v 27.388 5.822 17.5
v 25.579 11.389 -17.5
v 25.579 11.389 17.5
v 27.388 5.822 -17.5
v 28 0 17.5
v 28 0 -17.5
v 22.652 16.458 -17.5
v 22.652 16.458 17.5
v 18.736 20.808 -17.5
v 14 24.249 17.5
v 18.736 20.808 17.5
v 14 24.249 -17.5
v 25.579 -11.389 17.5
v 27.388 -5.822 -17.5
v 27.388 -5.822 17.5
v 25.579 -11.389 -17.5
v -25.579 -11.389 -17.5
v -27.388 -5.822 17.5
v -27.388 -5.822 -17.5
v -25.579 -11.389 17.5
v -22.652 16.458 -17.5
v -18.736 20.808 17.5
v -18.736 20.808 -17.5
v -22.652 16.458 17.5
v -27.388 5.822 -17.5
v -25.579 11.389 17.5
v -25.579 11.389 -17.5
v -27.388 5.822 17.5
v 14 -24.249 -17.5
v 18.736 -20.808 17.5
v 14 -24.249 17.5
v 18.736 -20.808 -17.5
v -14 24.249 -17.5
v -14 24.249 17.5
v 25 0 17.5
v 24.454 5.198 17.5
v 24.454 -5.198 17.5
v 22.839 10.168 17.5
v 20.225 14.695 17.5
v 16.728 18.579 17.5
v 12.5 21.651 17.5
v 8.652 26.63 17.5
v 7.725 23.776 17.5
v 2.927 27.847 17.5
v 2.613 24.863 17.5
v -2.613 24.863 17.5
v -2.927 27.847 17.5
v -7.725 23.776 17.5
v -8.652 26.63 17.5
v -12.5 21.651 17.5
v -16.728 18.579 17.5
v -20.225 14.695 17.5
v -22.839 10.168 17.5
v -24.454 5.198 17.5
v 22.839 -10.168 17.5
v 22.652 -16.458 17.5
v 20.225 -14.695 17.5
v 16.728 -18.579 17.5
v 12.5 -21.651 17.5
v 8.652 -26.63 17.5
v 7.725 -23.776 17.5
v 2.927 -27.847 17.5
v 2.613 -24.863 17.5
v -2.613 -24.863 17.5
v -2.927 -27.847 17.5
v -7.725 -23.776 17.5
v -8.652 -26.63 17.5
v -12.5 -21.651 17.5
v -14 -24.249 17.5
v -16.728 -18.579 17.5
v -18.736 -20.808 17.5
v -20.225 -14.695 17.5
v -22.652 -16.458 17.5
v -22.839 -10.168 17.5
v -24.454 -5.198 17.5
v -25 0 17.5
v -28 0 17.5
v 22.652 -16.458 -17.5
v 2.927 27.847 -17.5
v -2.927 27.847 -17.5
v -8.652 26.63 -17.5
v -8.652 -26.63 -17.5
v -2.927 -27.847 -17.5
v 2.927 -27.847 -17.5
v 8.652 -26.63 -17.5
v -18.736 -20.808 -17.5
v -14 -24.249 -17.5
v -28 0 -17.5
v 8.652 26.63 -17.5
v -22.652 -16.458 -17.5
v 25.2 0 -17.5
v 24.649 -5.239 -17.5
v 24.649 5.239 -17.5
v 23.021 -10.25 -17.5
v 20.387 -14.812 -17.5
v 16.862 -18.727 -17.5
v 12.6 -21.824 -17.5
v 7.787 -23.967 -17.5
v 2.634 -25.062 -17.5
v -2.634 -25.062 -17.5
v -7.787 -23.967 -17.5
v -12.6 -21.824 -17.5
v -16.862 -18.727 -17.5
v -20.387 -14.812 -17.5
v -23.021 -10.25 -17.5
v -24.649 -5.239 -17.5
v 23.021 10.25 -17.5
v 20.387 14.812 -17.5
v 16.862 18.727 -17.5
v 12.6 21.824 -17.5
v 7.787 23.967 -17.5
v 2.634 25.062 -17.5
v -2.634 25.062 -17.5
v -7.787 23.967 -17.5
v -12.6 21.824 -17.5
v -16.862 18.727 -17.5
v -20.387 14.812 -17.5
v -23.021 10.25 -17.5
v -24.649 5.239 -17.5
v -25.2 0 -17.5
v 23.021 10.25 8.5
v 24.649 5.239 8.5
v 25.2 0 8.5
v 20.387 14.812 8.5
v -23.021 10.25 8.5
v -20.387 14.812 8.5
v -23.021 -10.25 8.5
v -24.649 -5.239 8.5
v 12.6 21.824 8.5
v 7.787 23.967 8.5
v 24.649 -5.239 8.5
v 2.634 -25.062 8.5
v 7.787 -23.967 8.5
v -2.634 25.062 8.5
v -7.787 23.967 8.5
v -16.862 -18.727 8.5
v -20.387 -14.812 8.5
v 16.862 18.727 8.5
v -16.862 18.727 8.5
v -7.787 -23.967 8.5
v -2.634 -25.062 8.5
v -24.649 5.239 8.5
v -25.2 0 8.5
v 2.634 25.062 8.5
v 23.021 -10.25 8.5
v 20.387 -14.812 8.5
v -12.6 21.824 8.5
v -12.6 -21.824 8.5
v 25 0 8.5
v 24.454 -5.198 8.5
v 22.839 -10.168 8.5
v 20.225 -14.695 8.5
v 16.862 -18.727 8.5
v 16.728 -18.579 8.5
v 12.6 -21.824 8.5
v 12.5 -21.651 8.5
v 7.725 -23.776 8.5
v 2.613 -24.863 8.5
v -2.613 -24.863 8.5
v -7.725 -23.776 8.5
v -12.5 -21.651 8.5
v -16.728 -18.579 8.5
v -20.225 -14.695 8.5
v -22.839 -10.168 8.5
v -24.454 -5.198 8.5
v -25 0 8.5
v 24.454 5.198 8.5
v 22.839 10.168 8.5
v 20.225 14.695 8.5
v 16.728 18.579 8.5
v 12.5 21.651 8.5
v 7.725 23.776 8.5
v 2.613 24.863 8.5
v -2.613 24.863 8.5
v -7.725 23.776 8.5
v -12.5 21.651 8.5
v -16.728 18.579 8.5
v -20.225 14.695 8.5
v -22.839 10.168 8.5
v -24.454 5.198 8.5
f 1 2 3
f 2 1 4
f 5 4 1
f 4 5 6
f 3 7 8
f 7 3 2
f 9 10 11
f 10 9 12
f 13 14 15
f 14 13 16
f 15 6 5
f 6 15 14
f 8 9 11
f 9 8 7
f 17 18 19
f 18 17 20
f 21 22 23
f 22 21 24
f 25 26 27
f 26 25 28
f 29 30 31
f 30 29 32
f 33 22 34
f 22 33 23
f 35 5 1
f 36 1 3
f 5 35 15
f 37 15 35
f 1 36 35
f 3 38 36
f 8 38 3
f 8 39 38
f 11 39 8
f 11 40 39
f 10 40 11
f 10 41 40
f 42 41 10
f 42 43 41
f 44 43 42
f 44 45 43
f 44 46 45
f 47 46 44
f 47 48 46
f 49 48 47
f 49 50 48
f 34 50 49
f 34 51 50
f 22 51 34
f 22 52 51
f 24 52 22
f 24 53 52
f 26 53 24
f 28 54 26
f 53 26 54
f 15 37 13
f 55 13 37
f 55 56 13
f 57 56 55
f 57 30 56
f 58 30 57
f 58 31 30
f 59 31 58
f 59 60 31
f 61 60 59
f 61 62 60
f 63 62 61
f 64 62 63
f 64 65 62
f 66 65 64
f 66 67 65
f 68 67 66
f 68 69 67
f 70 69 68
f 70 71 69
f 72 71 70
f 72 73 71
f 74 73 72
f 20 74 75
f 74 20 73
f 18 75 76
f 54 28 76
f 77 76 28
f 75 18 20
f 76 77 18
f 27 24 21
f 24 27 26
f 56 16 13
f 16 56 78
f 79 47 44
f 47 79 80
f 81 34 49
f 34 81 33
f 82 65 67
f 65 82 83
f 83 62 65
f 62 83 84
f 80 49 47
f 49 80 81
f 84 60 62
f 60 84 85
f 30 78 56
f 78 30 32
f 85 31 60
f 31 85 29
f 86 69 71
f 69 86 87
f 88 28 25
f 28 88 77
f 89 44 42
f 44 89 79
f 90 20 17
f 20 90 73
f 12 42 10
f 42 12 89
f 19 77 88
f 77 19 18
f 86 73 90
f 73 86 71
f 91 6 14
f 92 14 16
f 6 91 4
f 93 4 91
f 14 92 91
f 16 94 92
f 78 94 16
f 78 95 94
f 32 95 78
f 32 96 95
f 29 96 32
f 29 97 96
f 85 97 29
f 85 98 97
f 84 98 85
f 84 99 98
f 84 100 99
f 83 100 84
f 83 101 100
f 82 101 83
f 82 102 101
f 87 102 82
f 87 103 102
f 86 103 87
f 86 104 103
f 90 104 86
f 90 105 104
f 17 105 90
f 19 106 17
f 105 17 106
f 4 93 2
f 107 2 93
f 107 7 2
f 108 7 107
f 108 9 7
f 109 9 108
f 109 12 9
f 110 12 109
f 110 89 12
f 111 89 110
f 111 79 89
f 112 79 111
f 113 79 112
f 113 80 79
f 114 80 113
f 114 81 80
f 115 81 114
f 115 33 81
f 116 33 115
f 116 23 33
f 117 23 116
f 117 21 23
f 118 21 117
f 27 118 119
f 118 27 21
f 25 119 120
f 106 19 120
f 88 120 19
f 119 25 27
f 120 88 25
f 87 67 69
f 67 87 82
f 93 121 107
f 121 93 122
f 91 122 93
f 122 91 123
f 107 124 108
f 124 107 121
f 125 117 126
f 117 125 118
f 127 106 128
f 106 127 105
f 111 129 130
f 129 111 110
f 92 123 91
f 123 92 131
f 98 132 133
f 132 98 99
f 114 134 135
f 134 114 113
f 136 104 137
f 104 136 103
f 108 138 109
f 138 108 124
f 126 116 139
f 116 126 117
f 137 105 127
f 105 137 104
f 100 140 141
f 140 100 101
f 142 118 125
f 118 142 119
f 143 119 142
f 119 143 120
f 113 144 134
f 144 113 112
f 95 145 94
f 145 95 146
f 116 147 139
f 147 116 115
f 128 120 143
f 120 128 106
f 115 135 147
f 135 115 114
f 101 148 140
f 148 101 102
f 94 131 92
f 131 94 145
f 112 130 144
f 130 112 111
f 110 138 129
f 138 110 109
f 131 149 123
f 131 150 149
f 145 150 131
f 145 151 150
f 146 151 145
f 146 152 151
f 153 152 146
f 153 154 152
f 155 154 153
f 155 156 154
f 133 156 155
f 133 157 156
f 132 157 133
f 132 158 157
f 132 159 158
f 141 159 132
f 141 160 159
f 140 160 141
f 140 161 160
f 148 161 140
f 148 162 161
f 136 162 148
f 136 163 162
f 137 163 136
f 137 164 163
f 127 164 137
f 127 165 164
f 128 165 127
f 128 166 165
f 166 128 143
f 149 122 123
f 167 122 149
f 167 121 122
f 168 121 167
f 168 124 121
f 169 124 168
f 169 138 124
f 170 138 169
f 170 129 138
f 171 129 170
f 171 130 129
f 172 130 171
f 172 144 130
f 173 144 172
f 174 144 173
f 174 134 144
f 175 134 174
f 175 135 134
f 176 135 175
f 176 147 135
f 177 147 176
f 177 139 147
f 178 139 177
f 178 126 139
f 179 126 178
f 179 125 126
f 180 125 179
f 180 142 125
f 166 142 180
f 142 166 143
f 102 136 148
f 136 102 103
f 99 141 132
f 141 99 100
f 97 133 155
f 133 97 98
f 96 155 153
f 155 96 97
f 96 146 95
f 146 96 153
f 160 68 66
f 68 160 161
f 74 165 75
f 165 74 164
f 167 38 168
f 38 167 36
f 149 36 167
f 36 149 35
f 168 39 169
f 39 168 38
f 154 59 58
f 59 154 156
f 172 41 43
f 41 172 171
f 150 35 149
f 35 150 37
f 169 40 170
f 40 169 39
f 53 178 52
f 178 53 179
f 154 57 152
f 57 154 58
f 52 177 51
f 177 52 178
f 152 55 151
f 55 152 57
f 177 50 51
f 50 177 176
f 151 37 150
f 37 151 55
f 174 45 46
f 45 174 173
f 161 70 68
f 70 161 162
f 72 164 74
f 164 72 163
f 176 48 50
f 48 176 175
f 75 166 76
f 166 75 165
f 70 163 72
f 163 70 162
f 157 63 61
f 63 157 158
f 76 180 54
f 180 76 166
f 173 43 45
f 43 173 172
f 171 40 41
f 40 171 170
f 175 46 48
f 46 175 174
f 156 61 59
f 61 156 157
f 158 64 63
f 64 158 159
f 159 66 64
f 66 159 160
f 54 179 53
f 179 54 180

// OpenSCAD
// Parameters
nominal_diameter_mm = 50; //[25:100:1]
tolerance_mm = 0.2; //[0.0:1.0:0.05]
wall_thickness_mm = 3.0; //[1.5:6.0:0.1]
cap_outer_diameter_mm = 56.0; //[45.0:80.0:0.5]
cap_length_mm = 35.0; //[20.0:70.0:0.5]
socket_depth_mm = 25.0; //[10.0:60.0:0.5]
pipe_outer_diameter_mm = 50.0; //[25.0:100.0:1]
pipe_wall_mm = 1.8; //[1.0:4.0:0.1]
pipe_stub_length_mm = 60.0; //[20.0:150.0:1]
include_pipe_stub = 0; //[0:1:1]
overlap_mm = 1.0; //[0.5:2.0:0.1]

// HT Pipe - complete geometry
module ht_pipe() {
  color([0.85, 0.85, 0.8]) { // Off-white for PVC
    difference() {
      // Outer pipe
      cylinder(h=pipe_stub_length_mm, r=pipe_outer_diameter_mm/2, center=true);
      // Inner void
      translate([0, 0, -overlap_mm/2])
        cylinder(h=pipe_stub_length_mm + overlap_mm, r=(pipe_outer_diameter_mm/2) - pipe_wall_mm, center=true);
    }
  }
}

// Cap body - complete geometry
module cap_body() {
  color([0.85, 0.85, 0.8]) { // Off-white for PVC
    difference() {
      // Outer cap
      cylinder(h=cap_length_mm, r=cap_outer_diameter_mm/2, center=true);
      // Socket void
      translate([0, 0, -cap_length_mm/2 + (socket_depth_mm + overlap_mm)/2])
        cylinder(h=socket_depth_mm + overlap_mm, r=(pipe_outer_diameter_mm + 2*tolerance_mm)/2, center=true);
      // End face void
      translate([0, 0, (-cap_length_mm/2 + wall_thickness_mm) + (cap_length_mm - wall_thickness_mm)/2])
        cylinder(h=cap_length_mm - wall_thickness_mm, r=(cap_outer_diameter_mm/2) - wall_thickness_mm, center=true);
    }
  }
}

// Assembly
module assembly() {
  cap_body();
  if (include_pipe_stub) {
    translate([0, 0, -cap_length_mm/2 + pipe_stub_length_mm/2 - overlap_mm])
      ht_pipe();
  }
}

assembly();
